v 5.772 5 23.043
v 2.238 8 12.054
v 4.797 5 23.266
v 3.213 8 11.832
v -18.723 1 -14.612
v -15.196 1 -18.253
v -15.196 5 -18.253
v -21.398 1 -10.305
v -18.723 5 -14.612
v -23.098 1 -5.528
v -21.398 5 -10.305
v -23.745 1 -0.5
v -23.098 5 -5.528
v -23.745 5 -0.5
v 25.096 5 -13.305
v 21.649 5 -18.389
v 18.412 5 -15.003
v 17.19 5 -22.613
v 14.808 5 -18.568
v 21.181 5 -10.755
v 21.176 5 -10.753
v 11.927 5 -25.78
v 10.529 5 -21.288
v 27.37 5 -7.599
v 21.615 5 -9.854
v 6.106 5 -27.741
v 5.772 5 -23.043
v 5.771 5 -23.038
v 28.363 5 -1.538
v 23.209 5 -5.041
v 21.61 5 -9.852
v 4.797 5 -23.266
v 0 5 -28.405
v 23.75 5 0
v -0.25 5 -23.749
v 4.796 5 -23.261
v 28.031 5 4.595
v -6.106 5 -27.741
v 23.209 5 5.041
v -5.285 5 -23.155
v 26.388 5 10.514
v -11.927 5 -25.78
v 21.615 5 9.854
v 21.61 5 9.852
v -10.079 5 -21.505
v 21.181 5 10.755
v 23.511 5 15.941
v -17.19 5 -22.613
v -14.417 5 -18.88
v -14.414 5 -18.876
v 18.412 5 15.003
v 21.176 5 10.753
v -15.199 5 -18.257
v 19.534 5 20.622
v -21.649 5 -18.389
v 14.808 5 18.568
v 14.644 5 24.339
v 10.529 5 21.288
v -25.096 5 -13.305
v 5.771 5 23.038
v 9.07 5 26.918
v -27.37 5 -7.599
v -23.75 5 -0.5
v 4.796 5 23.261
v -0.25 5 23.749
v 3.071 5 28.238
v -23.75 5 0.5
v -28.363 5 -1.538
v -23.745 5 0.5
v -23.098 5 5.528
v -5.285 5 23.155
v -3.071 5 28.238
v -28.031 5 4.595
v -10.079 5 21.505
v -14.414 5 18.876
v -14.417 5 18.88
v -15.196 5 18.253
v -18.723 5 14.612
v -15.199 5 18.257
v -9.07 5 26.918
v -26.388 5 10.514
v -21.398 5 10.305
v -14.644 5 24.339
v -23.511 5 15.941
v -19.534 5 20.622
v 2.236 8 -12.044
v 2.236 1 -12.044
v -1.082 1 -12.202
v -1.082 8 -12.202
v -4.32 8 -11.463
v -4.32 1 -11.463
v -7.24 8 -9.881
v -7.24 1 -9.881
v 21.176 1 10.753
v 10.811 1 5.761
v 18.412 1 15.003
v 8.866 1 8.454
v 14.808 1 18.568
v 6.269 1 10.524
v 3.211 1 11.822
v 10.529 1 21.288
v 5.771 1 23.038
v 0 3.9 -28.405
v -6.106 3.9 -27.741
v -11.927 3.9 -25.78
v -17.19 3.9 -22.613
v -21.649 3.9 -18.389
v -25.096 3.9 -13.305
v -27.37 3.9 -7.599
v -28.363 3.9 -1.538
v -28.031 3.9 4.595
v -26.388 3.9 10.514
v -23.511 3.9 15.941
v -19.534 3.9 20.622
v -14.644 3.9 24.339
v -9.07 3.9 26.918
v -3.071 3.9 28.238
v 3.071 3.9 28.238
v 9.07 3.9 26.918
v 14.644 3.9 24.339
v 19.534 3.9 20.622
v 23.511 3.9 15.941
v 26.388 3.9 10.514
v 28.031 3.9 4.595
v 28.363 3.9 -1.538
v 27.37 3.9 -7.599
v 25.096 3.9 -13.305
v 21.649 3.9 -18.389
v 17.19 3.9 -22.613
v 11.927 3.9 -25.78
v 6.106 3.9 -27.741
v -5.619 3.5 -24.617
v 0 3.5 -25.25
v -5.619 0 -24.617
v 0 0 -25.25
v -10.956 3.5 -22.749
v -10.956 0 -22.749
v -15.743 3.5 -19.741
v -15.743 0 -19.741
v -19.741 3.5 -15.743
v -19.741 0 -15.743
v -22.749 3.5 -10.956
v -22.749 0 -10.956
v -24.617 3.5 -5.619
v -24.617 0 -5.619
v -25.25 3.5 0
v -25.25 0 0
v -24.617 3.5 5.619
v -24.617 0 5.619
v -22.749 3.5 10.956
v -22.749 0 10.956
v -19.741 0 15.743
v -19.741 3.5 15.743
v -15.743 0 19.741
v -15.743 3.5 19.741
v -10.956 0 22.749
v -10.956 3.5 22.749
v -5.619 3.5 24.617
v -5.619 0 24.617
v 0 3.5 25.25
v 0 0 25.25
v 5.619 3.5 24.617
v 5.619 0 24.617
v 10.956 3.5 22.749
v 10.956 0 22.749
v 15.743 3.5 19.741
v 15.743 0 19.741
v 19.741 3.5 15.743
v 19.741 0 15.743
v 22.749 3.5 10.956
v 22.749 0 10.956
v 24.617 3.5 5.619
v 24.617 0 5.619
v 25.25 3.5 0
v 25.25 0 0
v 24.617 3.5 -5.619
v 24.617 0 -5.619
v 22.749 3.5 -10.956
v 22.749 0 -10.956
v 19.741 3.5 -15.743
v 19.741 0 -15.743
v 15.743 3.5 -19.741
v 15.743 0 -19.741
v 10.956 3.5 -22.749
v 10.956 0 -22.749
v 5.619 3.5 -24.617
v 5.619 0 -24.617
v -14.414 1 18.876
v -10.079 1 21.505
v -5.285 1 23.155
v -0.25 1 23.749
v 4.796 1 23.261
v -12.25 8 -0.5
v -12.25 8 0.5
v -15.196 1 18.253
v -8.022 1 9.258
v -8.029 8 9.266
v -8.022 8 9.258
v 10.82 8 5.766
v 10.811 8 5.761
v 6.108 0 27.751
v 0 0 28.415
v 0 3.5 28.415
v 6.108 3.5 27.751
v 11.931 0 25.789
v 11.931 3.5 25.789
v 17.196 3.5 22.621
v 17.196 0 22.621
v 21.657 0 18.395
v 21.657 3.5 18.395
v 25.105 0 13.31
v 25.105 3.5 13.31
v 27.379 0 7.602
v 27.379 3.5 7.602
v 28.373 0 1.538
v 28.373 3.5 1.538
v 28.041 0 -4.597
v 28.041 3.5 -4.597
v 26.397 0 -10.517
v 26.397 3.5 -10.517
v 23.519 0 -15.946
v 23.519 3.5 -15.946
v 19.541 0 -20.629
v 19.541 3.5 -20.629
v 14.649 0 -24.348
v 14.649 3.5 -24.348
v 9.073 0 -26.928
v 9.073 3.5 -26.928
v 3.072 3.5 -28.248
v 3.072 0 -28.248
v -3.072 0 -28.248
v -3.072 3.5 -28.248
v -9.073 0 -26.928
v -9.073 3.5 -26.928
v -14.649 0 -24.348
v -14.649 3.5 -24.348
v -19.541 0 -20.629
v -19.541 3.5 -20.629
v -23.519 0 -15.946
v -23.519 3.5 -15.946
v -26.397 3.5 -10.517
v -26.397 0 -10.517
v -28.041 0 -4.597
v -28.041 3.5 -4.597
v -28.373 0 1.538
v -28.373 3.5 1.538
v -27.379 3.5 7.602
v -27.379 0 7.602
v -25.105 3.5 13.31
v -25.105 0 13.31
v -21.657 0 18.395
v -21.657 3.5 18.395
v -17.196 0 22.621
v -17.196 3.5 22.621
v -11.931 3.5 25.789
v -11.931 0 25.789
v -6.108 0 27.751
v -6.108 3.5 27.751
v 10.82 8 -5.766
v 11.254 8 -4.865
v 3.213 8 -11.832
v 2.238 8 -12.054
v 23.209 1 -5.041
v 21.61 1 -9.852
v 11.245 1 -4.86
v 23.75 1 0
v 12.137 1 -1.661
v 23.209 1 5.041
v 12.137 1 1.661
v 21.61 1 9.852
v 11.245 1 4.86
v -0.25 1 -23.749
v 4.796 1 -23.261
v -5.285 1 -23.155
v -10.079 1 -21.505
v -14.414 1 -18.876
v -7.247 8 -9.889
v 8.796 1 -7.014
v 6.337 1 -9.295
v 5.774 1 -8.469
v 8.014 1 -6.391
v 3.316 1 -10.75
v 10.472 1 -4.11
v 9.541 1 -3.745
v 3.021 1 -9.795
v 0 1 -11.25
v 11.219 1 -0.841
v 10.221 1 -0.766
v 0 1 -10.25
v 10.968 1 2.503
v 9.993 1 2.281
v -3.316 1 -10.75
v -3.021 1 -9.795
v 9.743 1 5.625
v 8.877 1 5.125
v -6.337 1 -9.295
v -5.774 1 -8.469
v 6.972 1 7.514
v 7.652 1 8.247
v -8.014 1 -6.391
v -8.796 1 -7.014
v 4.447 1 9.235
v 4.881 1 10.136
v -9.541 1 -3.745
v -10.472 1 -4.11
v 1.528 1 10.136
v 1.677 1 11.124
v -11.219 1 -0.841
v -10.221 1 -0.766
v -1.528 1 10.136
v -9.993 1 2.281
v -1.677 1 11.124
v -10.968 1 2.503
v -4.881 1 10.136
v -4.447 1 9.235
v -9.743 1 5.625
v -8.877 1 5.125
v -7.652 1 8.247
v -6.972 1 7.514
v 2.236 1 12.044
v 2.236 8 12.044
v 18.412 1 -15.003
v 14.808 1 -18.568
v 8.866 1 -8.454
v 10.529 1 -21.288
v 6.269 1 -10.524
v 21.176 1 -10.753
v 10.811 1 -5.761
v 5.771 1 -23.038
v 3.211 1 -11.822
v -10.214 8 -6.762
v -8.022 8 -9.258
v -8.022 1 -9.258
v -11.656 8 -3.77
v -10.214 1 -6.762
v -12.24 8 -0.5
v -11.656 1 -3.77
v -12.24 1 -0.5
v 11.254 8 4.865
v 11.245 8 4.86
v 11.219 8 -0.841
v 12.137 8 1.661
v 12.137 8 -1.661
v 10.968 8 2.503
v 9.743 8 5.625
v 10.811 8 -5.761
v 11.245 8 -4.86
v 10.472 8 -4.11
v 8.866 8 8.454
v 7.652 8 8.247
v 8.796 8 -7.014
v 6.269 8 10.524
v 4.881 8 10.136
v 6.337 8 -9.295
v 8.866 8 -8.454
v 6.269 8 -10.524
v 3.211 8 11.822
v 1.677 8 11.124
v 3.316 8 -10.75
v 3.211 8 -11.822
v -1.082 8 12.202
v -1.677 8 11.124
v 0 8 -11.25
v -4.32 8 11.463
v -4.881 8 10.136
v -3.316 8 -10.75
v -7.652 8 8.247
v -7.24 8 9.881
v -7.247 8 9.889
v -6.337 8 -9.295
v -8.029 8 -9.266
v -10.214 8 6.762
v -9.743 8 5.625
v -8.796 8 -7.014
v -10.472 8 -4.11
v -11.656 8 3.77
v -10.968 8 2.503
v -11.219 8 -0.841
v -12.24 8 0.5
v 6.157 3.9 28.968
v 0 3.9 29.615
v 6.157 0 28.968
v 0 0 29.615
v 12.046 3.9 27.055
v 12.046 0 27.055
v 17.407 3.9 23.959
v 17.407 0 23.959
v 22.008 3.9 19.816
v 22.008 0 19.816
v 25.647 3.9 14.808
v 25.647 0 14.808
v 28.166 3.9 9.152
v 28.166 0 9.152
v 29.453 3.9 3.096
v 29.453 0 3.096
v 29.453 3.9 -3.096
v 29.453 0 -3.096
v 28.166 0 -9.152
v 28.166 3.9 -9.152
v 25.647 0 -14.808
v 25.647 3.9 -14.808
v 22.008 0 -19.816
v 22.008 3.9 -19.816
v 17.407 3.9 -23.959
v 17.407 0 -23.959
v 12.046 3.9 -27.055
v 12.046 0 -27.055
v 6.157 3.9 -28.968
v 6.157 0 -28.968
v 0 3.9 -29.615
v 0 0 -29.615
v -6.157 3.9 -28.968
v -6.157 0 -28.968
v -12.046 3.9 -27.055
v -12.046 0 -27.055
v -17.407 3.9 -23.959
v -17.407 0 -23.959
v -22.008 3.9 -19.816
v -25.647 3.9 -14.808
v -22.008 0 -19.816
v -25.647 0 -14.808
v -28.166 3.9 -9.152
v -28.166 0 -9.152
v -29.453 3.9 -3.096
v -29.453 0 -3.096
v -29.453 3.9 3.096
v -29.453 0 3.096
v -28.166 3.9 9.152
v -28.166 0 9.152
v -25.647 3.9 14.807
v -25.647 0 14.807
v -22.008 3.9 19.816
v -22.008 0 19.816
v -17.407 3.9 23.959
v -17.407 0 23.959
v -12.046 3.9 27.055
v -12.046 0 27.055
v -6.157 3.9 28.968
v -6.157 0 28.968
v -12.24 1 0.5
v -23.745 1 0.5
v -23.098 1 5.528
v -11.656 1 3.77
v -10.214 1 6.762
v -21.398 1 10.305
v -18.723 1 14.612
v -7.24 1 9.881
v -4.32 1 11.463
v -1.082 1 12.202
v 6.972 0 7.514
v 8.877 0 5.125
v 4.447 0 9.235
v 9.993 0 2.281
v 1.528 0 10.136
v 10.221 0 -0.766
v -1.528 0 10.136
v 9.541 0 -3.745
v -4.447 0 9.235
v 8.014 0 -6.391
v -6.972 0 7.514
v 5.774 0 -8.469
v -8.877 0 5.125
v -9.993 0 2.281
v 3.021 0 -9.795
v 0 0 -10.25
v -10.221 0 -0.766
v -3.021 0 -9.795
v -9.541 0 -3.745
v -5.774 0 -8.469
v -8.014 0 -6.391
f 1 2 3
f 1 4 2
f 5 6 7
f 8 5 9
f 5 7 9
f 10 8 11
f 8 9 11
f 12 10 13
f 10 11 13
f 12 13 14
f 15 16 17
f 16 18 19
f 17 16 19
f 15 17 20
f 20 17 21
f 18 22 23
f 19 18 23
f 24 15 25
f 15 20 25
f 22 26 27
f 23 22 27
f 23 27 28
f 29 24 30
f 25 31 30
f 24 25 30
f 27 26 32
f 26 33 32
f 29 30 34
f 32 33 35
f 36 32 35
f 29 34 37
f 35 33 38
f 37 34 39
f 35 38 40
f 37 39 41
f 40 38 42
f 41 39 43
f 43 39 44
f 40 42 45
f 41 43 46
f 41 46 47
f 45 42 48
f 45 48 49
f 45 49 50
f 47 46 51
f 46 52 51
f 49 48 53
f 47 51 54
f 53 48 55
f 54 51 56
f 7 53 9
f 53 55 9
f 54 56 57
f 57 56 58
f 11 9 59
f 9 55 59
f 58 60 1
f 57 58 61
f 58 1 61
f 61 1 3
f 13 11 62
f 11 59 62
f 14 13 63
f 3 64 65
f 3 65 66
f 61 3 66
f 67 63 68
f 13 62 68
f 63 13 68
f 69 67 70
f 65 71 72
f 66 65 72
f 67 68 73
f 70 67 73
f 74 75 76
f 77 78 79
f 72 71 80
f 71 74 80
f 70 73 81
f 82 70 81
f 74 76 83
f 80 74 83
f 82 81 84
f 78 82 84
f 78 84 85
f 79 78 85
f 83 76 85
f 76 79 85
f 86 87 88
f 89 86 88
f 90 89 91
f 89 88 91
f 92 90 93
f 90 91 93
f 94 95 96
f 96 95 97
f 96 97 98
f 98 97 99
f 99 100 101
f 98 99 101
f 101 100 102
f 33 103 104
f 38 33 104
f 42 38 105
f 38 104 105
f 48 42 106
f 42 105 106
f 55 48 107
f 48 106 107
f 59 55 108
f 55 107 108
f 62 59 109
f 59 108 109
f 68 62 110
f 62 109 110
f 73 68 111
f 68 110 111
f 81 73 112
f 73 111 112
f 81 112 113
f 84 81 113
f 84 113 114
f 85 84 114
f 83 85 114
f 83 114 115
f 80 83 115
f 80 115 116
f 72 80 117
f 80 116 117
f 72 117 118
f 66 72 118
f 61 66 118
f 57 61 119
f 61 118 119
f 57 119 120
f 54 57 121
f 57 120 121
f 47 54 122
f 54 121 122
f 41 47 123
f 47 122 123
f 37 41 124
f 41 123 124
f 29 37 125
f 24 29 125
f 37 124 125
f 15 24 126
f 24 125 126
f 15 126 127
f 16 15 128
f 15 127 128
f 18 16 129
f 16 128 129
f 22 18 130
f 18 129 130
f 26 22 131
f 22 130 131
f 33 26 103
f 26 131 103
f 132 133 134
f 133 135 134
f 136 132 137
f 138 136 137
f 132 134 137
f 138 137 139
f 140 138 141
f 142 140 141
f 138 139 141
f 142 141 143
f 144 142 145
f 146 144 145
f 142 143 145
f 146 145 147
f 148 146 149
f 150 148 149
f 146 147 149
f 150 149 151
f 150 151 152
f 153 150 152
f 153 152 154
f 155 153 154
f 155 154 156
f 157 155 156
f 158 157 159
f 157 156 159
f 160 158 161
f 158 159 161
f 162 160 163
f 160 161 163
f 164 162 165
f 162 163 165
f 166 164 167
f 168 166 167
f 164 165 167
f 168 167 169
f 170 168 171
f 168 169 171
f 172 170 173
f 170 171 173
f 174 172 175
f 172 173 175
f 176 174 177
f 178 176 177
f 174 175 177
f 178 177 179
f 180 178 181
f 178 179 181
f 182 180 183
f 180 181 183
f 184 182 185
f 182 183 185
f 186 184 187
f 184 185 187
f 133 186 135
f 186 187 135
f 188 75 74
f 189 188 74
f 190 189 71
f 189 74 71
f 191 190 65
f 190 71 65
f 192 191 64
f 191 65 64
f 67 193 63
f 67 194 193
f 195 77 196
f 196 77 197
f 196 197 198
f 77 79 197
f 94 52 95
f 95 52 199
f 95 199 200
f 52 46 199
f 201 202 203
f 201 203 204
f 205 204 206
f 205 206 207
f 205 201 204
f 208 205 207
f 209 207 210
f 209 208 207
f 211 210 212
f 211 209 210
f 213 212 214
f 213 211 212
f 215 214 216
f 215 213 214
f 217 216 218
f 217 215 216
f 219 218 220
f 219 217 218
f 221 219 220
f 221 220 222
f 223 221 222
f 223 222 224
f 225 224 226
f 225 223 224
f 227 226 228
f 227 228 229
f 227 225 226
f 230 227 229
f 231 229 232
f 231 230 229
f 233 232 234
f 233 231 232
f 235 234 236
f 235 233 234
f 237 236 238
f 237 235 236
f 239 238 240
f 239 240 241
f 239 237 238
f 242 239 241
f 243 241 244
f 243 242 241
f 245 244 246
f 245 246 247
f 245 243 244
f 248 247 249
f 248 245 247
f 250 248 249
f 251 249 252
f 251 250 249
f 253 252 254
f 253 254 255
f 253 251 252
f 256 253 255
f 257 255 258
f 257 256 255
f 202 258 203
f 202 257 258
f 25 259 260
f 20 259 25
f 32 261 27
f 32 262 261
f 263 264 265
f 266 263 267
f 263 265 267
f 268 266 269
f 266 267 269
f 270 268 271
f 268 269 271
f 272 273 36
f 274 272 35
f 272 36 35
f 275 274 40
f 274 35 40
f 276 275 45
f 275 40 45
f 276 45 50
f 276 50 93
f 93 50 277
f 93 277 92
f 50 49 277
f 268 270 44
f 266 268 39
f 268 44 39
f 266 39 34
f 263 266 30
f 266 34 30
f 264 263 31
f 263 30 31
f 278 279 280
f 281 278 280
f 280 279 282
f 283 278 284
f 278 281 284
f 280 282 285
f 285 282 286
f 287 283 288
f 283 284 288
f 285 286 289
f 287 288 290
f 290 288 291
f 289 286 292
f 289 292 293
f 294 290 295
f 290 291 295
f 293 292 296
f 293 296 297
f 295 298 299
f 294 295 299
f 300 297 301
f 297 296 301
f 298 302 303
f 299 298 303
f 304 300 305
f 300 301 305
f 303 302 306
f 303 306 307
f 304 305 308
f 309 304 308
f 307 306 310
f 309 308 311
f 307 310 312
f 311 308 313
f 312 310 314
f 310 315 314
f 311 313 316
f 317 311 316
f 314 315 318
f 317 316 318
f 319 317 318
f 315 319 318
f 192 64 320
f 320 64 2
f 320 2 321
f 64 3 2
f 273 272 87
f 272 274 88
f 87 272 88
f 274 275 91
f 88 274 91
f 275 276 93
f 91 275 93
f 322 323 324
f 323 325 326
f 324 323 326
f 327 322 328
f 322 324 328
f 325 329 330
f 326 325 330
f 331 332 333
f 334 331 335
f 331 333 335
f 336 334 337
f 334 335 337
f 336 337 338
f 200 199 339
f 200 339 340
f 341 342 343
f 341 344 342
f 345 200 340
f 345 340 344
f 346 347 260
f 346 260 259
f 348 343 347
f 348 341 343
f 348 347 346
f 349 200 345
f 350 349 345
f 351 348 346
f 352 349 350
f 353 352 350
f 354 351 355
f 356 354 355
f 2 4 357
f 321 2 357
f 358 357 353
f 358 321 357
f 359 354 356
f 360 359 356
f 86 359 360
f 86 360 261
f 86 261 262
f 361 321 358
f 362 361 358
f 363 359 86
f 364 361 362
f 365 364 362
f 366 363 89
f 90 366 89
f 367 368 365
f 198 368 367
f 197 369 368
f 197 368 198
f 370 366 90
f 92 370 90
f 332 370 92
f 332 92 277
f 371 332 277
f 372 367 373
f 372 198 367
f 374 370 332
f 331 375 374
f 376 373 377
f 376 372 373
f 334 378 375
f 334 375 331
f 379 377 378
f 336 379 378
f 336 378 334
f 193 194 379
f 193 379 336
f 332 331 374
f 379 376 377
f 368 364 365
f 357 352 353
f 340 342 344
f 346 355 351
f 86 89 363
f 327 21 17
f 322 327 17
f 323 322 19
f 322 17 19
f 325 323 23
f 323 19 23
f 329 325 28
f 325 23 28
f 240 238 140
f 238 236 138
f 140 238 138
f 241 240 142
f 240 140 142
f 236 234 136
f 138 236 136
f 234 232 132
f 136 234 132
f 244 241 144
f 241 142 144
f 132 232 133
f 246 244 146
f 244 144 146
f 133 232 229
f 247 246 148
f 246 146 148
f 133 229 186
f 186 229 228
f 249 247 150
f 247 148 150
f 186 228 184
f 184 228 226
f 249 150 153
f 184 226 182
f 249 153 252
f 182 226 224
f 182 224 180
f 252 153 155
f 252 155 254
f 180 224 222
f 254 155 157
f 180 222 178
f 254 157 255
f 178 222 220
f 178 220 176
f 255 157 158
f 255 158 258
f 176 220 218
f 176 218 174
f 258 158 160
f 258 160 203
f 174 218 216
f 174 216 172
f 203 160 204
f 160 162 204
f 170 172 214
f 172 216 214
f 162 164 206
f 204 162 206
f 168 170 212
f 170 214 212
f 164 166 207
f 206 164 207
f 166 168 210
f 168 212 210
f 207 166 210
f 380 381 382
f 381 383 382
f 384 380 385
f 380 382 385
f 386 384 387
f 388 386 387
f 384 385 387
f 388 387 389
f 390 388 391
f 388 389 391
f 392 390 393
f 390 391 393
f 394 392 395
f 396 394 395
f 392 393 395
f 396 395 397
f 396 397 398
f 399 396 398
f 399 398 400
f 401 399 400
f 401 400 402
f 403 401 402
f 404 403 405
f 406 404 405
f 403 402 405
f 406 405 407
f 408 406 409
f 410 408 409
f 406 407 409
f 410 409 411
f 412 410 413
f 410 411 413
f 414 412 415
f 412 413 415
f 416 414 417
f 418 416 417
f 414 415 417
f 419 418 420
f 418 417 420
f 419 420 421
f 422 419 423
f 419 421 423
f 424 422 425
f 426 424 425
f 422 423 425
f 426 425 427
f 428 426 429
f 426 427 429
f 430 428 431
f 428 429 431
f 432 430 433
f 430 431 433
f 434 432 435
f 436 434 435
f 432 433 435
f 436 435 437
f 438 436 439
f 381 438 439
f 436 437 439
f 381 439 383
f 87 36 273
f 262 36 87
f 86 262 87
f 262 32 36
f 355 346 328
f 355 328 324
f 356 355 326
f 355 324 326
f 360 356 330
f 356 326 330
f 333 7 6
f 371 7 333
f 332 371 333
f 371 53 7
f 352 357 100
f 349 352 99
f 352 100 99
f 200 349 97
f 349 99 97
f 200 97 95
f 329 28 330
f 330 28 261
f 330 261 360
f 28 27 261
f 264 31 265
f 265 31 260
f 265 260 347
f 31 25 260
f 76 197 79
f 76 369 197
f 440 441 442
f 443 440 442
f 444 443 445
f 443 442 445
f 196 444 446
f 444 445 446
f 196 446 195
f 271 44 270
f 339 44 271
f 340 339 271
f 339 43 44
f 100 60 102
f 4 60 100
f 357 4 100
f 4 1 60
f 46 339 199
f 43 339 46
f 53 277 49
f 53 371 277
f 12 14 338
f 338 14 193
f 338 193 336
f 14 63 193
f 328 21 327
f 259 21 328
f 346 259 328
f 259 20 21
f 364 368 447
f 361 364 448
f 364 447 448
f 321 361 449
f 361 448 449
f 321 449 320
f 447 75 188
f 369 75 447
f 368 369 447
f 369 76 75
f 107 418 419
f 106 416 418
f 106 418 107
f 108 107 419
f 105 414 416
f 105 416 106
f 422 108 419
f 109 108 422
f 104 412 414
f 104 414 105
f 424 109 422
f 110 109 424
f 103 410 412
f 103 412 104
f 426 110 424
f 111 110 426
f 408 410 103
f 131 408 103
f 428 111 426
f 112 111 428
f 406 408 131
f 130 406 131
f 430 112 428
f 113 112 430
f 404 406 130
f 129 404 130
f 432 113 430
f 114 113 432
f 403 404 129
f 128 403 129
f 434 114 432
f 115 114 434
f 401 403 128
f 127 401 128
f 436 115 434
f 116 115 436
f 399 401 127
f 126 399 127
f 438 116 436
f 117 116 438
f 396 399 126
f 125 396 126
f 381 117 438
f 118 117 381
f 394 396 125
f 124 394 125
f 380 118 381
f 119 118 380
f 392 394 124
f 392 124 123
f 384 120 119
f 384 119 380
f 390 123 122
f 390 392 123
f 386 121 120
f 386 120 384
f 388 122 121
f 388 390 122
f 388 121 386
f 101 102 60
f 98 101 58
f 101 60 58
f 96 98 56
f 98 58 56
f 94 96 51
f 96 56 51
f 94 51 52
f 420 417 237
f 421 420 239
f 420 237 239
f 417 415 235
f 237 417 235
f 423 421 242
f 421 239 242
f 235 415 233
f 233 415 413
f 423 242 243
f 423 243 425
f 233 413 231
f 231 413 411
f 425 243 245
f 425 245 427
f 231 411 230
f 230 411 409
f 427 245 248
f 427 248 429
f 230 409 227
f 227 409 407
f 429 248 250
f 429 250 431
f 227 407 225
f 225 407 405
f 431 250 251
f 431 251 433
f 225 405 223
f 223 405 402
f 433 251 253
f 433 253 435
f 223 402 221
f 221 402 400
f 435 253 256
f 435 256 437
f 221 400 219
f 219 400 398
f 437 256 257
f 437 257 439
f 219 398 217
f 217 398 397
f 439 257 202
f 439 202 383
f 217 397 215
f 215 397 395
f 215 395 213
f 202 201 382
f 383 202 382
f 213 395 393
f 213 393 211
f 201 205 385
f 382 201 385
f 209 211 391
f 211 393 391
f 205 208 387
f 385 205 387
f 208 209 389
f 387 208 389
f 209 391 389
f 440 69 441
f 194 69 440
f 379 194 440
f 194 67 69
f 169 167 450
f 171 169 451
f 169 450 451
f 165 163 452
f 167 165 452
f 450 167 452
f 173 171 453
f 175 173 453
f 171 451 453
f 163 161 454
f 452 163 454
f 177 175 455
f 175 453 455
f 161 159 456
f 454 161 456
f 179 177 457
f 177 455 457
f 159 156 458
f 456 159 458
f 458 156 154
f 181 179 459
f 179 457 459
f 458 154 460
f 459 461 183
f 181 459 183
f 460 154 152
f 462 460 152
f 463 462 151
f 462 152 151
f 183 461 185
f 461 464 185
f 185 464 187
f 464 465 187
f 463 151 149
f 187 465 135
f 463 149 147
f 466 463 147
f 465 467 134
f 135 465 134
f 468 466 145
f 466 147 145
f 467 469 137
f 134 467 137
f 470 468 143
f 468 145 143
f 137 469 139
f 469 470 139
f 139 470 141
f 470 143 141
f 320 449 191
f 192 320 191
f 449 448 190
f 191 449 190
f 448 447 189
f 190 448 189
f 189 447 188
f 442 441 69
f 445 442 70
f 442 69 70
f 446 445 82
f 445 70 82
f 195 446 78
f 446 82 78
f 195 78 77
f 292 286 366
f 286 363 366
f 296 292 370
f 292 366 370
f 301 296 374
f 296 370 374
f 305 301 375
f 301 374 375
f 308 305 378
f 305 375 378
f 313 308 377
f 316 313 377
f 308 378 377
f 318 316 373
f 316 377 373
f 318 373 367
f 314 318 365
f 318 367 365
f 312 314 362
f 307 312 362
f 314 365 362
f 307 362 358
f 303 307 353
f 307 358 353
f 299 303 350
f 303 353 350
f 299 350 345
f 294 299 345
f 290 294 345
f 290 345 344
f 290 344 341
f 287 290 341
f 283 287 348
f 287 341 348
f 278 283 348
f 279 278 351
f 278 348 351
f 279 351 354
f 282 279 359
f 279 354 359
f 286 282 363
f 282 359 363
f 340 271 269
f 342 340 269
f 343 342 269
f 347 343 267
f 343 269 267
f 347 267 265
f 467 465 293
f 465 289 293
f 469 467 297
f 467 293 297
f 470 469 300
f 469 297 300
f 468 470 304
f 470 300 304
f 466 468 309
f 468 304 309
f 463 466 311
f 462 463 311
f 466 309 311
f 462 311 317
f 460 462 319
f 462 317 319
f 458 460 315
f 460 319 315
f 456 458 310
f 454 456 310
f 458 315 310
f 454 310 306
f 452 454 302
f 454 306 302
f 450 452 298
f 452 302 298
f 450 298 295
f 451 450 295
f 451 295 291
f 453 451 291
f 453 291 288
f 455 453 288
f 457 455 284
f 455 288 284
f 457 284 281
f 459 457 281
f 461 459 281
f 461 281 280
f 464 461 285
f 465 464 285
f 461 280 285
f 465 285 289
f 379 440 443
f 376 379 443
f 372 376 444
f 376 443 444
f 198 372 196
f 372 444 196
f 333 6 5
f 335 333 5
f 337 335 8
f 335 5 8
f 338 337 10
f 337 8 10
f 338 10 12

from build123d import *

# Parameters (mm, degrees)
BOSS_EXTRUDE1_DEPTH = 0.5
CIRPATTERN1_COUNT   = 7
SKETCH3_R           = 29.615
SKETCH3_R_2         = 28.415
BOSS_EXTRUDE2_DEPTH = 3.5
BOSS_EXTRUDE3_START = 3.5
SKETCH3_3_R         = 29.615
SKETCH3_3_R_2       = 28.415
SKETCH3_3_R_3       = 28.405
BOSS_EXTRUDE3_DEPTH = 0.4


with BuildPart() as part:
    # Sketch1 → Revolve1 (revolve)
    with BuildSketch(Plane.XY, mode=Mode.PRIVATE) as revolve1_sk:
        Polygon((-11.25, 8), (-12.25, 8), (-12.25, 1), (-23.75, 1), (-23.75, 5), (-28.405, 5), (-28.405, 3.5), (-25.25, 3.5), (-25.25, 0), (-10.25, 0), (-10.25, 1), (-11.25, 1), align=None)
    revolve(revolve1_sk.sketch.rotate(Axis((0, 0, 0), (0, 1, 0)), 270), axis=Axis((0, 0, 0), (0, 1, 0)))

    # Sketch2 → Boss-Extrude1 (add, symmetric)
    with BuildSketch(Plane.XY):
        Polygon((-12.25, 8), (-23.75, 5), (-24.25, 5), (-24.25, 1), (-23.75, 1), (-12.25, 1), (-11.75, 1), (-11.75, 8), align=None)
    boss_extrude1 = extrude(amount=BOSS_EXTRUDE1_DEPTH, both=True)

    # CirPattern1: Boss-Extrude1 ×7 about axis
    cirpattern1_axis = Axis((0, 0, 0), (0, 1, 0))
    for i in range(1, CIRPATTERN1_COUNT):
        add(boss_extrude1.rotate(cirpattern1_axis, i * 360 / CIRPATTERN1_COUNT))



with BuildPart() as body_2:
    # Sketch3 → Boss-Extrude2 (new body)
    with BuildSketch(Plane(origin=(0, 0, 0), x_dir=(1, 0, 0), z_dir=(0, 1, 0))):
        with Locations(Location((0, 0, 0), (0, 0, 270))):
            Circle(SKETCH3_R)
        with Locations(Location((0, 0, 0), (0, 0, 270))):
            Circle(SKETCH3_R_2, mode=Mode.SUBTRACT)
    extrude(amount=BOSS_EXTRUDE2_DEPTH)


with BuildPart() as part_1:
    add(part.part)

    add(body_2.part)  # Boss-Extrude3 merges body 2
    # Sketch3<3> → Boss-Extrude3 (add)
    # profile 1 of 2: a face of its own
    with BuildSketch(Plane(origin=(0, 0, 0), x_dir=(1, 0, 0), z_dir=(0, 1, 0)).offset(BOSS_EXTRUDE3_START)):
        with Locations(Location((0, 0, 0), (0, 0, 270))):
            Circle(SKETCH3_3_R)
        with Locations(Location((0, 0, 0), (0, 0, 270))):
            Circle(SKETCH3_3_R_2, mode=Mode.SUBTRACT)
    # profile 2 of 2: a face of its own
    with BuildSketch(Plane(origin=(0, 0, 0), x_dir=(1, 0, 0), z_dir=(0, 1, 0)).offset(BOSS_EXTRUDE3_START)):
        with Locations(Location((0, 0, 0), (0, 0, 270))):
            Circle(SKETCH3_3_R_2)
        with Locations(Location((0, 0, 0), (0, 0, 90))):
            Circle(SKETCH3_3_R_3, mode=Mode.SUBTRACT)
    extrude(amount=BOSS_EXTRUDE3_DEPTH)


solid = part_1.part
